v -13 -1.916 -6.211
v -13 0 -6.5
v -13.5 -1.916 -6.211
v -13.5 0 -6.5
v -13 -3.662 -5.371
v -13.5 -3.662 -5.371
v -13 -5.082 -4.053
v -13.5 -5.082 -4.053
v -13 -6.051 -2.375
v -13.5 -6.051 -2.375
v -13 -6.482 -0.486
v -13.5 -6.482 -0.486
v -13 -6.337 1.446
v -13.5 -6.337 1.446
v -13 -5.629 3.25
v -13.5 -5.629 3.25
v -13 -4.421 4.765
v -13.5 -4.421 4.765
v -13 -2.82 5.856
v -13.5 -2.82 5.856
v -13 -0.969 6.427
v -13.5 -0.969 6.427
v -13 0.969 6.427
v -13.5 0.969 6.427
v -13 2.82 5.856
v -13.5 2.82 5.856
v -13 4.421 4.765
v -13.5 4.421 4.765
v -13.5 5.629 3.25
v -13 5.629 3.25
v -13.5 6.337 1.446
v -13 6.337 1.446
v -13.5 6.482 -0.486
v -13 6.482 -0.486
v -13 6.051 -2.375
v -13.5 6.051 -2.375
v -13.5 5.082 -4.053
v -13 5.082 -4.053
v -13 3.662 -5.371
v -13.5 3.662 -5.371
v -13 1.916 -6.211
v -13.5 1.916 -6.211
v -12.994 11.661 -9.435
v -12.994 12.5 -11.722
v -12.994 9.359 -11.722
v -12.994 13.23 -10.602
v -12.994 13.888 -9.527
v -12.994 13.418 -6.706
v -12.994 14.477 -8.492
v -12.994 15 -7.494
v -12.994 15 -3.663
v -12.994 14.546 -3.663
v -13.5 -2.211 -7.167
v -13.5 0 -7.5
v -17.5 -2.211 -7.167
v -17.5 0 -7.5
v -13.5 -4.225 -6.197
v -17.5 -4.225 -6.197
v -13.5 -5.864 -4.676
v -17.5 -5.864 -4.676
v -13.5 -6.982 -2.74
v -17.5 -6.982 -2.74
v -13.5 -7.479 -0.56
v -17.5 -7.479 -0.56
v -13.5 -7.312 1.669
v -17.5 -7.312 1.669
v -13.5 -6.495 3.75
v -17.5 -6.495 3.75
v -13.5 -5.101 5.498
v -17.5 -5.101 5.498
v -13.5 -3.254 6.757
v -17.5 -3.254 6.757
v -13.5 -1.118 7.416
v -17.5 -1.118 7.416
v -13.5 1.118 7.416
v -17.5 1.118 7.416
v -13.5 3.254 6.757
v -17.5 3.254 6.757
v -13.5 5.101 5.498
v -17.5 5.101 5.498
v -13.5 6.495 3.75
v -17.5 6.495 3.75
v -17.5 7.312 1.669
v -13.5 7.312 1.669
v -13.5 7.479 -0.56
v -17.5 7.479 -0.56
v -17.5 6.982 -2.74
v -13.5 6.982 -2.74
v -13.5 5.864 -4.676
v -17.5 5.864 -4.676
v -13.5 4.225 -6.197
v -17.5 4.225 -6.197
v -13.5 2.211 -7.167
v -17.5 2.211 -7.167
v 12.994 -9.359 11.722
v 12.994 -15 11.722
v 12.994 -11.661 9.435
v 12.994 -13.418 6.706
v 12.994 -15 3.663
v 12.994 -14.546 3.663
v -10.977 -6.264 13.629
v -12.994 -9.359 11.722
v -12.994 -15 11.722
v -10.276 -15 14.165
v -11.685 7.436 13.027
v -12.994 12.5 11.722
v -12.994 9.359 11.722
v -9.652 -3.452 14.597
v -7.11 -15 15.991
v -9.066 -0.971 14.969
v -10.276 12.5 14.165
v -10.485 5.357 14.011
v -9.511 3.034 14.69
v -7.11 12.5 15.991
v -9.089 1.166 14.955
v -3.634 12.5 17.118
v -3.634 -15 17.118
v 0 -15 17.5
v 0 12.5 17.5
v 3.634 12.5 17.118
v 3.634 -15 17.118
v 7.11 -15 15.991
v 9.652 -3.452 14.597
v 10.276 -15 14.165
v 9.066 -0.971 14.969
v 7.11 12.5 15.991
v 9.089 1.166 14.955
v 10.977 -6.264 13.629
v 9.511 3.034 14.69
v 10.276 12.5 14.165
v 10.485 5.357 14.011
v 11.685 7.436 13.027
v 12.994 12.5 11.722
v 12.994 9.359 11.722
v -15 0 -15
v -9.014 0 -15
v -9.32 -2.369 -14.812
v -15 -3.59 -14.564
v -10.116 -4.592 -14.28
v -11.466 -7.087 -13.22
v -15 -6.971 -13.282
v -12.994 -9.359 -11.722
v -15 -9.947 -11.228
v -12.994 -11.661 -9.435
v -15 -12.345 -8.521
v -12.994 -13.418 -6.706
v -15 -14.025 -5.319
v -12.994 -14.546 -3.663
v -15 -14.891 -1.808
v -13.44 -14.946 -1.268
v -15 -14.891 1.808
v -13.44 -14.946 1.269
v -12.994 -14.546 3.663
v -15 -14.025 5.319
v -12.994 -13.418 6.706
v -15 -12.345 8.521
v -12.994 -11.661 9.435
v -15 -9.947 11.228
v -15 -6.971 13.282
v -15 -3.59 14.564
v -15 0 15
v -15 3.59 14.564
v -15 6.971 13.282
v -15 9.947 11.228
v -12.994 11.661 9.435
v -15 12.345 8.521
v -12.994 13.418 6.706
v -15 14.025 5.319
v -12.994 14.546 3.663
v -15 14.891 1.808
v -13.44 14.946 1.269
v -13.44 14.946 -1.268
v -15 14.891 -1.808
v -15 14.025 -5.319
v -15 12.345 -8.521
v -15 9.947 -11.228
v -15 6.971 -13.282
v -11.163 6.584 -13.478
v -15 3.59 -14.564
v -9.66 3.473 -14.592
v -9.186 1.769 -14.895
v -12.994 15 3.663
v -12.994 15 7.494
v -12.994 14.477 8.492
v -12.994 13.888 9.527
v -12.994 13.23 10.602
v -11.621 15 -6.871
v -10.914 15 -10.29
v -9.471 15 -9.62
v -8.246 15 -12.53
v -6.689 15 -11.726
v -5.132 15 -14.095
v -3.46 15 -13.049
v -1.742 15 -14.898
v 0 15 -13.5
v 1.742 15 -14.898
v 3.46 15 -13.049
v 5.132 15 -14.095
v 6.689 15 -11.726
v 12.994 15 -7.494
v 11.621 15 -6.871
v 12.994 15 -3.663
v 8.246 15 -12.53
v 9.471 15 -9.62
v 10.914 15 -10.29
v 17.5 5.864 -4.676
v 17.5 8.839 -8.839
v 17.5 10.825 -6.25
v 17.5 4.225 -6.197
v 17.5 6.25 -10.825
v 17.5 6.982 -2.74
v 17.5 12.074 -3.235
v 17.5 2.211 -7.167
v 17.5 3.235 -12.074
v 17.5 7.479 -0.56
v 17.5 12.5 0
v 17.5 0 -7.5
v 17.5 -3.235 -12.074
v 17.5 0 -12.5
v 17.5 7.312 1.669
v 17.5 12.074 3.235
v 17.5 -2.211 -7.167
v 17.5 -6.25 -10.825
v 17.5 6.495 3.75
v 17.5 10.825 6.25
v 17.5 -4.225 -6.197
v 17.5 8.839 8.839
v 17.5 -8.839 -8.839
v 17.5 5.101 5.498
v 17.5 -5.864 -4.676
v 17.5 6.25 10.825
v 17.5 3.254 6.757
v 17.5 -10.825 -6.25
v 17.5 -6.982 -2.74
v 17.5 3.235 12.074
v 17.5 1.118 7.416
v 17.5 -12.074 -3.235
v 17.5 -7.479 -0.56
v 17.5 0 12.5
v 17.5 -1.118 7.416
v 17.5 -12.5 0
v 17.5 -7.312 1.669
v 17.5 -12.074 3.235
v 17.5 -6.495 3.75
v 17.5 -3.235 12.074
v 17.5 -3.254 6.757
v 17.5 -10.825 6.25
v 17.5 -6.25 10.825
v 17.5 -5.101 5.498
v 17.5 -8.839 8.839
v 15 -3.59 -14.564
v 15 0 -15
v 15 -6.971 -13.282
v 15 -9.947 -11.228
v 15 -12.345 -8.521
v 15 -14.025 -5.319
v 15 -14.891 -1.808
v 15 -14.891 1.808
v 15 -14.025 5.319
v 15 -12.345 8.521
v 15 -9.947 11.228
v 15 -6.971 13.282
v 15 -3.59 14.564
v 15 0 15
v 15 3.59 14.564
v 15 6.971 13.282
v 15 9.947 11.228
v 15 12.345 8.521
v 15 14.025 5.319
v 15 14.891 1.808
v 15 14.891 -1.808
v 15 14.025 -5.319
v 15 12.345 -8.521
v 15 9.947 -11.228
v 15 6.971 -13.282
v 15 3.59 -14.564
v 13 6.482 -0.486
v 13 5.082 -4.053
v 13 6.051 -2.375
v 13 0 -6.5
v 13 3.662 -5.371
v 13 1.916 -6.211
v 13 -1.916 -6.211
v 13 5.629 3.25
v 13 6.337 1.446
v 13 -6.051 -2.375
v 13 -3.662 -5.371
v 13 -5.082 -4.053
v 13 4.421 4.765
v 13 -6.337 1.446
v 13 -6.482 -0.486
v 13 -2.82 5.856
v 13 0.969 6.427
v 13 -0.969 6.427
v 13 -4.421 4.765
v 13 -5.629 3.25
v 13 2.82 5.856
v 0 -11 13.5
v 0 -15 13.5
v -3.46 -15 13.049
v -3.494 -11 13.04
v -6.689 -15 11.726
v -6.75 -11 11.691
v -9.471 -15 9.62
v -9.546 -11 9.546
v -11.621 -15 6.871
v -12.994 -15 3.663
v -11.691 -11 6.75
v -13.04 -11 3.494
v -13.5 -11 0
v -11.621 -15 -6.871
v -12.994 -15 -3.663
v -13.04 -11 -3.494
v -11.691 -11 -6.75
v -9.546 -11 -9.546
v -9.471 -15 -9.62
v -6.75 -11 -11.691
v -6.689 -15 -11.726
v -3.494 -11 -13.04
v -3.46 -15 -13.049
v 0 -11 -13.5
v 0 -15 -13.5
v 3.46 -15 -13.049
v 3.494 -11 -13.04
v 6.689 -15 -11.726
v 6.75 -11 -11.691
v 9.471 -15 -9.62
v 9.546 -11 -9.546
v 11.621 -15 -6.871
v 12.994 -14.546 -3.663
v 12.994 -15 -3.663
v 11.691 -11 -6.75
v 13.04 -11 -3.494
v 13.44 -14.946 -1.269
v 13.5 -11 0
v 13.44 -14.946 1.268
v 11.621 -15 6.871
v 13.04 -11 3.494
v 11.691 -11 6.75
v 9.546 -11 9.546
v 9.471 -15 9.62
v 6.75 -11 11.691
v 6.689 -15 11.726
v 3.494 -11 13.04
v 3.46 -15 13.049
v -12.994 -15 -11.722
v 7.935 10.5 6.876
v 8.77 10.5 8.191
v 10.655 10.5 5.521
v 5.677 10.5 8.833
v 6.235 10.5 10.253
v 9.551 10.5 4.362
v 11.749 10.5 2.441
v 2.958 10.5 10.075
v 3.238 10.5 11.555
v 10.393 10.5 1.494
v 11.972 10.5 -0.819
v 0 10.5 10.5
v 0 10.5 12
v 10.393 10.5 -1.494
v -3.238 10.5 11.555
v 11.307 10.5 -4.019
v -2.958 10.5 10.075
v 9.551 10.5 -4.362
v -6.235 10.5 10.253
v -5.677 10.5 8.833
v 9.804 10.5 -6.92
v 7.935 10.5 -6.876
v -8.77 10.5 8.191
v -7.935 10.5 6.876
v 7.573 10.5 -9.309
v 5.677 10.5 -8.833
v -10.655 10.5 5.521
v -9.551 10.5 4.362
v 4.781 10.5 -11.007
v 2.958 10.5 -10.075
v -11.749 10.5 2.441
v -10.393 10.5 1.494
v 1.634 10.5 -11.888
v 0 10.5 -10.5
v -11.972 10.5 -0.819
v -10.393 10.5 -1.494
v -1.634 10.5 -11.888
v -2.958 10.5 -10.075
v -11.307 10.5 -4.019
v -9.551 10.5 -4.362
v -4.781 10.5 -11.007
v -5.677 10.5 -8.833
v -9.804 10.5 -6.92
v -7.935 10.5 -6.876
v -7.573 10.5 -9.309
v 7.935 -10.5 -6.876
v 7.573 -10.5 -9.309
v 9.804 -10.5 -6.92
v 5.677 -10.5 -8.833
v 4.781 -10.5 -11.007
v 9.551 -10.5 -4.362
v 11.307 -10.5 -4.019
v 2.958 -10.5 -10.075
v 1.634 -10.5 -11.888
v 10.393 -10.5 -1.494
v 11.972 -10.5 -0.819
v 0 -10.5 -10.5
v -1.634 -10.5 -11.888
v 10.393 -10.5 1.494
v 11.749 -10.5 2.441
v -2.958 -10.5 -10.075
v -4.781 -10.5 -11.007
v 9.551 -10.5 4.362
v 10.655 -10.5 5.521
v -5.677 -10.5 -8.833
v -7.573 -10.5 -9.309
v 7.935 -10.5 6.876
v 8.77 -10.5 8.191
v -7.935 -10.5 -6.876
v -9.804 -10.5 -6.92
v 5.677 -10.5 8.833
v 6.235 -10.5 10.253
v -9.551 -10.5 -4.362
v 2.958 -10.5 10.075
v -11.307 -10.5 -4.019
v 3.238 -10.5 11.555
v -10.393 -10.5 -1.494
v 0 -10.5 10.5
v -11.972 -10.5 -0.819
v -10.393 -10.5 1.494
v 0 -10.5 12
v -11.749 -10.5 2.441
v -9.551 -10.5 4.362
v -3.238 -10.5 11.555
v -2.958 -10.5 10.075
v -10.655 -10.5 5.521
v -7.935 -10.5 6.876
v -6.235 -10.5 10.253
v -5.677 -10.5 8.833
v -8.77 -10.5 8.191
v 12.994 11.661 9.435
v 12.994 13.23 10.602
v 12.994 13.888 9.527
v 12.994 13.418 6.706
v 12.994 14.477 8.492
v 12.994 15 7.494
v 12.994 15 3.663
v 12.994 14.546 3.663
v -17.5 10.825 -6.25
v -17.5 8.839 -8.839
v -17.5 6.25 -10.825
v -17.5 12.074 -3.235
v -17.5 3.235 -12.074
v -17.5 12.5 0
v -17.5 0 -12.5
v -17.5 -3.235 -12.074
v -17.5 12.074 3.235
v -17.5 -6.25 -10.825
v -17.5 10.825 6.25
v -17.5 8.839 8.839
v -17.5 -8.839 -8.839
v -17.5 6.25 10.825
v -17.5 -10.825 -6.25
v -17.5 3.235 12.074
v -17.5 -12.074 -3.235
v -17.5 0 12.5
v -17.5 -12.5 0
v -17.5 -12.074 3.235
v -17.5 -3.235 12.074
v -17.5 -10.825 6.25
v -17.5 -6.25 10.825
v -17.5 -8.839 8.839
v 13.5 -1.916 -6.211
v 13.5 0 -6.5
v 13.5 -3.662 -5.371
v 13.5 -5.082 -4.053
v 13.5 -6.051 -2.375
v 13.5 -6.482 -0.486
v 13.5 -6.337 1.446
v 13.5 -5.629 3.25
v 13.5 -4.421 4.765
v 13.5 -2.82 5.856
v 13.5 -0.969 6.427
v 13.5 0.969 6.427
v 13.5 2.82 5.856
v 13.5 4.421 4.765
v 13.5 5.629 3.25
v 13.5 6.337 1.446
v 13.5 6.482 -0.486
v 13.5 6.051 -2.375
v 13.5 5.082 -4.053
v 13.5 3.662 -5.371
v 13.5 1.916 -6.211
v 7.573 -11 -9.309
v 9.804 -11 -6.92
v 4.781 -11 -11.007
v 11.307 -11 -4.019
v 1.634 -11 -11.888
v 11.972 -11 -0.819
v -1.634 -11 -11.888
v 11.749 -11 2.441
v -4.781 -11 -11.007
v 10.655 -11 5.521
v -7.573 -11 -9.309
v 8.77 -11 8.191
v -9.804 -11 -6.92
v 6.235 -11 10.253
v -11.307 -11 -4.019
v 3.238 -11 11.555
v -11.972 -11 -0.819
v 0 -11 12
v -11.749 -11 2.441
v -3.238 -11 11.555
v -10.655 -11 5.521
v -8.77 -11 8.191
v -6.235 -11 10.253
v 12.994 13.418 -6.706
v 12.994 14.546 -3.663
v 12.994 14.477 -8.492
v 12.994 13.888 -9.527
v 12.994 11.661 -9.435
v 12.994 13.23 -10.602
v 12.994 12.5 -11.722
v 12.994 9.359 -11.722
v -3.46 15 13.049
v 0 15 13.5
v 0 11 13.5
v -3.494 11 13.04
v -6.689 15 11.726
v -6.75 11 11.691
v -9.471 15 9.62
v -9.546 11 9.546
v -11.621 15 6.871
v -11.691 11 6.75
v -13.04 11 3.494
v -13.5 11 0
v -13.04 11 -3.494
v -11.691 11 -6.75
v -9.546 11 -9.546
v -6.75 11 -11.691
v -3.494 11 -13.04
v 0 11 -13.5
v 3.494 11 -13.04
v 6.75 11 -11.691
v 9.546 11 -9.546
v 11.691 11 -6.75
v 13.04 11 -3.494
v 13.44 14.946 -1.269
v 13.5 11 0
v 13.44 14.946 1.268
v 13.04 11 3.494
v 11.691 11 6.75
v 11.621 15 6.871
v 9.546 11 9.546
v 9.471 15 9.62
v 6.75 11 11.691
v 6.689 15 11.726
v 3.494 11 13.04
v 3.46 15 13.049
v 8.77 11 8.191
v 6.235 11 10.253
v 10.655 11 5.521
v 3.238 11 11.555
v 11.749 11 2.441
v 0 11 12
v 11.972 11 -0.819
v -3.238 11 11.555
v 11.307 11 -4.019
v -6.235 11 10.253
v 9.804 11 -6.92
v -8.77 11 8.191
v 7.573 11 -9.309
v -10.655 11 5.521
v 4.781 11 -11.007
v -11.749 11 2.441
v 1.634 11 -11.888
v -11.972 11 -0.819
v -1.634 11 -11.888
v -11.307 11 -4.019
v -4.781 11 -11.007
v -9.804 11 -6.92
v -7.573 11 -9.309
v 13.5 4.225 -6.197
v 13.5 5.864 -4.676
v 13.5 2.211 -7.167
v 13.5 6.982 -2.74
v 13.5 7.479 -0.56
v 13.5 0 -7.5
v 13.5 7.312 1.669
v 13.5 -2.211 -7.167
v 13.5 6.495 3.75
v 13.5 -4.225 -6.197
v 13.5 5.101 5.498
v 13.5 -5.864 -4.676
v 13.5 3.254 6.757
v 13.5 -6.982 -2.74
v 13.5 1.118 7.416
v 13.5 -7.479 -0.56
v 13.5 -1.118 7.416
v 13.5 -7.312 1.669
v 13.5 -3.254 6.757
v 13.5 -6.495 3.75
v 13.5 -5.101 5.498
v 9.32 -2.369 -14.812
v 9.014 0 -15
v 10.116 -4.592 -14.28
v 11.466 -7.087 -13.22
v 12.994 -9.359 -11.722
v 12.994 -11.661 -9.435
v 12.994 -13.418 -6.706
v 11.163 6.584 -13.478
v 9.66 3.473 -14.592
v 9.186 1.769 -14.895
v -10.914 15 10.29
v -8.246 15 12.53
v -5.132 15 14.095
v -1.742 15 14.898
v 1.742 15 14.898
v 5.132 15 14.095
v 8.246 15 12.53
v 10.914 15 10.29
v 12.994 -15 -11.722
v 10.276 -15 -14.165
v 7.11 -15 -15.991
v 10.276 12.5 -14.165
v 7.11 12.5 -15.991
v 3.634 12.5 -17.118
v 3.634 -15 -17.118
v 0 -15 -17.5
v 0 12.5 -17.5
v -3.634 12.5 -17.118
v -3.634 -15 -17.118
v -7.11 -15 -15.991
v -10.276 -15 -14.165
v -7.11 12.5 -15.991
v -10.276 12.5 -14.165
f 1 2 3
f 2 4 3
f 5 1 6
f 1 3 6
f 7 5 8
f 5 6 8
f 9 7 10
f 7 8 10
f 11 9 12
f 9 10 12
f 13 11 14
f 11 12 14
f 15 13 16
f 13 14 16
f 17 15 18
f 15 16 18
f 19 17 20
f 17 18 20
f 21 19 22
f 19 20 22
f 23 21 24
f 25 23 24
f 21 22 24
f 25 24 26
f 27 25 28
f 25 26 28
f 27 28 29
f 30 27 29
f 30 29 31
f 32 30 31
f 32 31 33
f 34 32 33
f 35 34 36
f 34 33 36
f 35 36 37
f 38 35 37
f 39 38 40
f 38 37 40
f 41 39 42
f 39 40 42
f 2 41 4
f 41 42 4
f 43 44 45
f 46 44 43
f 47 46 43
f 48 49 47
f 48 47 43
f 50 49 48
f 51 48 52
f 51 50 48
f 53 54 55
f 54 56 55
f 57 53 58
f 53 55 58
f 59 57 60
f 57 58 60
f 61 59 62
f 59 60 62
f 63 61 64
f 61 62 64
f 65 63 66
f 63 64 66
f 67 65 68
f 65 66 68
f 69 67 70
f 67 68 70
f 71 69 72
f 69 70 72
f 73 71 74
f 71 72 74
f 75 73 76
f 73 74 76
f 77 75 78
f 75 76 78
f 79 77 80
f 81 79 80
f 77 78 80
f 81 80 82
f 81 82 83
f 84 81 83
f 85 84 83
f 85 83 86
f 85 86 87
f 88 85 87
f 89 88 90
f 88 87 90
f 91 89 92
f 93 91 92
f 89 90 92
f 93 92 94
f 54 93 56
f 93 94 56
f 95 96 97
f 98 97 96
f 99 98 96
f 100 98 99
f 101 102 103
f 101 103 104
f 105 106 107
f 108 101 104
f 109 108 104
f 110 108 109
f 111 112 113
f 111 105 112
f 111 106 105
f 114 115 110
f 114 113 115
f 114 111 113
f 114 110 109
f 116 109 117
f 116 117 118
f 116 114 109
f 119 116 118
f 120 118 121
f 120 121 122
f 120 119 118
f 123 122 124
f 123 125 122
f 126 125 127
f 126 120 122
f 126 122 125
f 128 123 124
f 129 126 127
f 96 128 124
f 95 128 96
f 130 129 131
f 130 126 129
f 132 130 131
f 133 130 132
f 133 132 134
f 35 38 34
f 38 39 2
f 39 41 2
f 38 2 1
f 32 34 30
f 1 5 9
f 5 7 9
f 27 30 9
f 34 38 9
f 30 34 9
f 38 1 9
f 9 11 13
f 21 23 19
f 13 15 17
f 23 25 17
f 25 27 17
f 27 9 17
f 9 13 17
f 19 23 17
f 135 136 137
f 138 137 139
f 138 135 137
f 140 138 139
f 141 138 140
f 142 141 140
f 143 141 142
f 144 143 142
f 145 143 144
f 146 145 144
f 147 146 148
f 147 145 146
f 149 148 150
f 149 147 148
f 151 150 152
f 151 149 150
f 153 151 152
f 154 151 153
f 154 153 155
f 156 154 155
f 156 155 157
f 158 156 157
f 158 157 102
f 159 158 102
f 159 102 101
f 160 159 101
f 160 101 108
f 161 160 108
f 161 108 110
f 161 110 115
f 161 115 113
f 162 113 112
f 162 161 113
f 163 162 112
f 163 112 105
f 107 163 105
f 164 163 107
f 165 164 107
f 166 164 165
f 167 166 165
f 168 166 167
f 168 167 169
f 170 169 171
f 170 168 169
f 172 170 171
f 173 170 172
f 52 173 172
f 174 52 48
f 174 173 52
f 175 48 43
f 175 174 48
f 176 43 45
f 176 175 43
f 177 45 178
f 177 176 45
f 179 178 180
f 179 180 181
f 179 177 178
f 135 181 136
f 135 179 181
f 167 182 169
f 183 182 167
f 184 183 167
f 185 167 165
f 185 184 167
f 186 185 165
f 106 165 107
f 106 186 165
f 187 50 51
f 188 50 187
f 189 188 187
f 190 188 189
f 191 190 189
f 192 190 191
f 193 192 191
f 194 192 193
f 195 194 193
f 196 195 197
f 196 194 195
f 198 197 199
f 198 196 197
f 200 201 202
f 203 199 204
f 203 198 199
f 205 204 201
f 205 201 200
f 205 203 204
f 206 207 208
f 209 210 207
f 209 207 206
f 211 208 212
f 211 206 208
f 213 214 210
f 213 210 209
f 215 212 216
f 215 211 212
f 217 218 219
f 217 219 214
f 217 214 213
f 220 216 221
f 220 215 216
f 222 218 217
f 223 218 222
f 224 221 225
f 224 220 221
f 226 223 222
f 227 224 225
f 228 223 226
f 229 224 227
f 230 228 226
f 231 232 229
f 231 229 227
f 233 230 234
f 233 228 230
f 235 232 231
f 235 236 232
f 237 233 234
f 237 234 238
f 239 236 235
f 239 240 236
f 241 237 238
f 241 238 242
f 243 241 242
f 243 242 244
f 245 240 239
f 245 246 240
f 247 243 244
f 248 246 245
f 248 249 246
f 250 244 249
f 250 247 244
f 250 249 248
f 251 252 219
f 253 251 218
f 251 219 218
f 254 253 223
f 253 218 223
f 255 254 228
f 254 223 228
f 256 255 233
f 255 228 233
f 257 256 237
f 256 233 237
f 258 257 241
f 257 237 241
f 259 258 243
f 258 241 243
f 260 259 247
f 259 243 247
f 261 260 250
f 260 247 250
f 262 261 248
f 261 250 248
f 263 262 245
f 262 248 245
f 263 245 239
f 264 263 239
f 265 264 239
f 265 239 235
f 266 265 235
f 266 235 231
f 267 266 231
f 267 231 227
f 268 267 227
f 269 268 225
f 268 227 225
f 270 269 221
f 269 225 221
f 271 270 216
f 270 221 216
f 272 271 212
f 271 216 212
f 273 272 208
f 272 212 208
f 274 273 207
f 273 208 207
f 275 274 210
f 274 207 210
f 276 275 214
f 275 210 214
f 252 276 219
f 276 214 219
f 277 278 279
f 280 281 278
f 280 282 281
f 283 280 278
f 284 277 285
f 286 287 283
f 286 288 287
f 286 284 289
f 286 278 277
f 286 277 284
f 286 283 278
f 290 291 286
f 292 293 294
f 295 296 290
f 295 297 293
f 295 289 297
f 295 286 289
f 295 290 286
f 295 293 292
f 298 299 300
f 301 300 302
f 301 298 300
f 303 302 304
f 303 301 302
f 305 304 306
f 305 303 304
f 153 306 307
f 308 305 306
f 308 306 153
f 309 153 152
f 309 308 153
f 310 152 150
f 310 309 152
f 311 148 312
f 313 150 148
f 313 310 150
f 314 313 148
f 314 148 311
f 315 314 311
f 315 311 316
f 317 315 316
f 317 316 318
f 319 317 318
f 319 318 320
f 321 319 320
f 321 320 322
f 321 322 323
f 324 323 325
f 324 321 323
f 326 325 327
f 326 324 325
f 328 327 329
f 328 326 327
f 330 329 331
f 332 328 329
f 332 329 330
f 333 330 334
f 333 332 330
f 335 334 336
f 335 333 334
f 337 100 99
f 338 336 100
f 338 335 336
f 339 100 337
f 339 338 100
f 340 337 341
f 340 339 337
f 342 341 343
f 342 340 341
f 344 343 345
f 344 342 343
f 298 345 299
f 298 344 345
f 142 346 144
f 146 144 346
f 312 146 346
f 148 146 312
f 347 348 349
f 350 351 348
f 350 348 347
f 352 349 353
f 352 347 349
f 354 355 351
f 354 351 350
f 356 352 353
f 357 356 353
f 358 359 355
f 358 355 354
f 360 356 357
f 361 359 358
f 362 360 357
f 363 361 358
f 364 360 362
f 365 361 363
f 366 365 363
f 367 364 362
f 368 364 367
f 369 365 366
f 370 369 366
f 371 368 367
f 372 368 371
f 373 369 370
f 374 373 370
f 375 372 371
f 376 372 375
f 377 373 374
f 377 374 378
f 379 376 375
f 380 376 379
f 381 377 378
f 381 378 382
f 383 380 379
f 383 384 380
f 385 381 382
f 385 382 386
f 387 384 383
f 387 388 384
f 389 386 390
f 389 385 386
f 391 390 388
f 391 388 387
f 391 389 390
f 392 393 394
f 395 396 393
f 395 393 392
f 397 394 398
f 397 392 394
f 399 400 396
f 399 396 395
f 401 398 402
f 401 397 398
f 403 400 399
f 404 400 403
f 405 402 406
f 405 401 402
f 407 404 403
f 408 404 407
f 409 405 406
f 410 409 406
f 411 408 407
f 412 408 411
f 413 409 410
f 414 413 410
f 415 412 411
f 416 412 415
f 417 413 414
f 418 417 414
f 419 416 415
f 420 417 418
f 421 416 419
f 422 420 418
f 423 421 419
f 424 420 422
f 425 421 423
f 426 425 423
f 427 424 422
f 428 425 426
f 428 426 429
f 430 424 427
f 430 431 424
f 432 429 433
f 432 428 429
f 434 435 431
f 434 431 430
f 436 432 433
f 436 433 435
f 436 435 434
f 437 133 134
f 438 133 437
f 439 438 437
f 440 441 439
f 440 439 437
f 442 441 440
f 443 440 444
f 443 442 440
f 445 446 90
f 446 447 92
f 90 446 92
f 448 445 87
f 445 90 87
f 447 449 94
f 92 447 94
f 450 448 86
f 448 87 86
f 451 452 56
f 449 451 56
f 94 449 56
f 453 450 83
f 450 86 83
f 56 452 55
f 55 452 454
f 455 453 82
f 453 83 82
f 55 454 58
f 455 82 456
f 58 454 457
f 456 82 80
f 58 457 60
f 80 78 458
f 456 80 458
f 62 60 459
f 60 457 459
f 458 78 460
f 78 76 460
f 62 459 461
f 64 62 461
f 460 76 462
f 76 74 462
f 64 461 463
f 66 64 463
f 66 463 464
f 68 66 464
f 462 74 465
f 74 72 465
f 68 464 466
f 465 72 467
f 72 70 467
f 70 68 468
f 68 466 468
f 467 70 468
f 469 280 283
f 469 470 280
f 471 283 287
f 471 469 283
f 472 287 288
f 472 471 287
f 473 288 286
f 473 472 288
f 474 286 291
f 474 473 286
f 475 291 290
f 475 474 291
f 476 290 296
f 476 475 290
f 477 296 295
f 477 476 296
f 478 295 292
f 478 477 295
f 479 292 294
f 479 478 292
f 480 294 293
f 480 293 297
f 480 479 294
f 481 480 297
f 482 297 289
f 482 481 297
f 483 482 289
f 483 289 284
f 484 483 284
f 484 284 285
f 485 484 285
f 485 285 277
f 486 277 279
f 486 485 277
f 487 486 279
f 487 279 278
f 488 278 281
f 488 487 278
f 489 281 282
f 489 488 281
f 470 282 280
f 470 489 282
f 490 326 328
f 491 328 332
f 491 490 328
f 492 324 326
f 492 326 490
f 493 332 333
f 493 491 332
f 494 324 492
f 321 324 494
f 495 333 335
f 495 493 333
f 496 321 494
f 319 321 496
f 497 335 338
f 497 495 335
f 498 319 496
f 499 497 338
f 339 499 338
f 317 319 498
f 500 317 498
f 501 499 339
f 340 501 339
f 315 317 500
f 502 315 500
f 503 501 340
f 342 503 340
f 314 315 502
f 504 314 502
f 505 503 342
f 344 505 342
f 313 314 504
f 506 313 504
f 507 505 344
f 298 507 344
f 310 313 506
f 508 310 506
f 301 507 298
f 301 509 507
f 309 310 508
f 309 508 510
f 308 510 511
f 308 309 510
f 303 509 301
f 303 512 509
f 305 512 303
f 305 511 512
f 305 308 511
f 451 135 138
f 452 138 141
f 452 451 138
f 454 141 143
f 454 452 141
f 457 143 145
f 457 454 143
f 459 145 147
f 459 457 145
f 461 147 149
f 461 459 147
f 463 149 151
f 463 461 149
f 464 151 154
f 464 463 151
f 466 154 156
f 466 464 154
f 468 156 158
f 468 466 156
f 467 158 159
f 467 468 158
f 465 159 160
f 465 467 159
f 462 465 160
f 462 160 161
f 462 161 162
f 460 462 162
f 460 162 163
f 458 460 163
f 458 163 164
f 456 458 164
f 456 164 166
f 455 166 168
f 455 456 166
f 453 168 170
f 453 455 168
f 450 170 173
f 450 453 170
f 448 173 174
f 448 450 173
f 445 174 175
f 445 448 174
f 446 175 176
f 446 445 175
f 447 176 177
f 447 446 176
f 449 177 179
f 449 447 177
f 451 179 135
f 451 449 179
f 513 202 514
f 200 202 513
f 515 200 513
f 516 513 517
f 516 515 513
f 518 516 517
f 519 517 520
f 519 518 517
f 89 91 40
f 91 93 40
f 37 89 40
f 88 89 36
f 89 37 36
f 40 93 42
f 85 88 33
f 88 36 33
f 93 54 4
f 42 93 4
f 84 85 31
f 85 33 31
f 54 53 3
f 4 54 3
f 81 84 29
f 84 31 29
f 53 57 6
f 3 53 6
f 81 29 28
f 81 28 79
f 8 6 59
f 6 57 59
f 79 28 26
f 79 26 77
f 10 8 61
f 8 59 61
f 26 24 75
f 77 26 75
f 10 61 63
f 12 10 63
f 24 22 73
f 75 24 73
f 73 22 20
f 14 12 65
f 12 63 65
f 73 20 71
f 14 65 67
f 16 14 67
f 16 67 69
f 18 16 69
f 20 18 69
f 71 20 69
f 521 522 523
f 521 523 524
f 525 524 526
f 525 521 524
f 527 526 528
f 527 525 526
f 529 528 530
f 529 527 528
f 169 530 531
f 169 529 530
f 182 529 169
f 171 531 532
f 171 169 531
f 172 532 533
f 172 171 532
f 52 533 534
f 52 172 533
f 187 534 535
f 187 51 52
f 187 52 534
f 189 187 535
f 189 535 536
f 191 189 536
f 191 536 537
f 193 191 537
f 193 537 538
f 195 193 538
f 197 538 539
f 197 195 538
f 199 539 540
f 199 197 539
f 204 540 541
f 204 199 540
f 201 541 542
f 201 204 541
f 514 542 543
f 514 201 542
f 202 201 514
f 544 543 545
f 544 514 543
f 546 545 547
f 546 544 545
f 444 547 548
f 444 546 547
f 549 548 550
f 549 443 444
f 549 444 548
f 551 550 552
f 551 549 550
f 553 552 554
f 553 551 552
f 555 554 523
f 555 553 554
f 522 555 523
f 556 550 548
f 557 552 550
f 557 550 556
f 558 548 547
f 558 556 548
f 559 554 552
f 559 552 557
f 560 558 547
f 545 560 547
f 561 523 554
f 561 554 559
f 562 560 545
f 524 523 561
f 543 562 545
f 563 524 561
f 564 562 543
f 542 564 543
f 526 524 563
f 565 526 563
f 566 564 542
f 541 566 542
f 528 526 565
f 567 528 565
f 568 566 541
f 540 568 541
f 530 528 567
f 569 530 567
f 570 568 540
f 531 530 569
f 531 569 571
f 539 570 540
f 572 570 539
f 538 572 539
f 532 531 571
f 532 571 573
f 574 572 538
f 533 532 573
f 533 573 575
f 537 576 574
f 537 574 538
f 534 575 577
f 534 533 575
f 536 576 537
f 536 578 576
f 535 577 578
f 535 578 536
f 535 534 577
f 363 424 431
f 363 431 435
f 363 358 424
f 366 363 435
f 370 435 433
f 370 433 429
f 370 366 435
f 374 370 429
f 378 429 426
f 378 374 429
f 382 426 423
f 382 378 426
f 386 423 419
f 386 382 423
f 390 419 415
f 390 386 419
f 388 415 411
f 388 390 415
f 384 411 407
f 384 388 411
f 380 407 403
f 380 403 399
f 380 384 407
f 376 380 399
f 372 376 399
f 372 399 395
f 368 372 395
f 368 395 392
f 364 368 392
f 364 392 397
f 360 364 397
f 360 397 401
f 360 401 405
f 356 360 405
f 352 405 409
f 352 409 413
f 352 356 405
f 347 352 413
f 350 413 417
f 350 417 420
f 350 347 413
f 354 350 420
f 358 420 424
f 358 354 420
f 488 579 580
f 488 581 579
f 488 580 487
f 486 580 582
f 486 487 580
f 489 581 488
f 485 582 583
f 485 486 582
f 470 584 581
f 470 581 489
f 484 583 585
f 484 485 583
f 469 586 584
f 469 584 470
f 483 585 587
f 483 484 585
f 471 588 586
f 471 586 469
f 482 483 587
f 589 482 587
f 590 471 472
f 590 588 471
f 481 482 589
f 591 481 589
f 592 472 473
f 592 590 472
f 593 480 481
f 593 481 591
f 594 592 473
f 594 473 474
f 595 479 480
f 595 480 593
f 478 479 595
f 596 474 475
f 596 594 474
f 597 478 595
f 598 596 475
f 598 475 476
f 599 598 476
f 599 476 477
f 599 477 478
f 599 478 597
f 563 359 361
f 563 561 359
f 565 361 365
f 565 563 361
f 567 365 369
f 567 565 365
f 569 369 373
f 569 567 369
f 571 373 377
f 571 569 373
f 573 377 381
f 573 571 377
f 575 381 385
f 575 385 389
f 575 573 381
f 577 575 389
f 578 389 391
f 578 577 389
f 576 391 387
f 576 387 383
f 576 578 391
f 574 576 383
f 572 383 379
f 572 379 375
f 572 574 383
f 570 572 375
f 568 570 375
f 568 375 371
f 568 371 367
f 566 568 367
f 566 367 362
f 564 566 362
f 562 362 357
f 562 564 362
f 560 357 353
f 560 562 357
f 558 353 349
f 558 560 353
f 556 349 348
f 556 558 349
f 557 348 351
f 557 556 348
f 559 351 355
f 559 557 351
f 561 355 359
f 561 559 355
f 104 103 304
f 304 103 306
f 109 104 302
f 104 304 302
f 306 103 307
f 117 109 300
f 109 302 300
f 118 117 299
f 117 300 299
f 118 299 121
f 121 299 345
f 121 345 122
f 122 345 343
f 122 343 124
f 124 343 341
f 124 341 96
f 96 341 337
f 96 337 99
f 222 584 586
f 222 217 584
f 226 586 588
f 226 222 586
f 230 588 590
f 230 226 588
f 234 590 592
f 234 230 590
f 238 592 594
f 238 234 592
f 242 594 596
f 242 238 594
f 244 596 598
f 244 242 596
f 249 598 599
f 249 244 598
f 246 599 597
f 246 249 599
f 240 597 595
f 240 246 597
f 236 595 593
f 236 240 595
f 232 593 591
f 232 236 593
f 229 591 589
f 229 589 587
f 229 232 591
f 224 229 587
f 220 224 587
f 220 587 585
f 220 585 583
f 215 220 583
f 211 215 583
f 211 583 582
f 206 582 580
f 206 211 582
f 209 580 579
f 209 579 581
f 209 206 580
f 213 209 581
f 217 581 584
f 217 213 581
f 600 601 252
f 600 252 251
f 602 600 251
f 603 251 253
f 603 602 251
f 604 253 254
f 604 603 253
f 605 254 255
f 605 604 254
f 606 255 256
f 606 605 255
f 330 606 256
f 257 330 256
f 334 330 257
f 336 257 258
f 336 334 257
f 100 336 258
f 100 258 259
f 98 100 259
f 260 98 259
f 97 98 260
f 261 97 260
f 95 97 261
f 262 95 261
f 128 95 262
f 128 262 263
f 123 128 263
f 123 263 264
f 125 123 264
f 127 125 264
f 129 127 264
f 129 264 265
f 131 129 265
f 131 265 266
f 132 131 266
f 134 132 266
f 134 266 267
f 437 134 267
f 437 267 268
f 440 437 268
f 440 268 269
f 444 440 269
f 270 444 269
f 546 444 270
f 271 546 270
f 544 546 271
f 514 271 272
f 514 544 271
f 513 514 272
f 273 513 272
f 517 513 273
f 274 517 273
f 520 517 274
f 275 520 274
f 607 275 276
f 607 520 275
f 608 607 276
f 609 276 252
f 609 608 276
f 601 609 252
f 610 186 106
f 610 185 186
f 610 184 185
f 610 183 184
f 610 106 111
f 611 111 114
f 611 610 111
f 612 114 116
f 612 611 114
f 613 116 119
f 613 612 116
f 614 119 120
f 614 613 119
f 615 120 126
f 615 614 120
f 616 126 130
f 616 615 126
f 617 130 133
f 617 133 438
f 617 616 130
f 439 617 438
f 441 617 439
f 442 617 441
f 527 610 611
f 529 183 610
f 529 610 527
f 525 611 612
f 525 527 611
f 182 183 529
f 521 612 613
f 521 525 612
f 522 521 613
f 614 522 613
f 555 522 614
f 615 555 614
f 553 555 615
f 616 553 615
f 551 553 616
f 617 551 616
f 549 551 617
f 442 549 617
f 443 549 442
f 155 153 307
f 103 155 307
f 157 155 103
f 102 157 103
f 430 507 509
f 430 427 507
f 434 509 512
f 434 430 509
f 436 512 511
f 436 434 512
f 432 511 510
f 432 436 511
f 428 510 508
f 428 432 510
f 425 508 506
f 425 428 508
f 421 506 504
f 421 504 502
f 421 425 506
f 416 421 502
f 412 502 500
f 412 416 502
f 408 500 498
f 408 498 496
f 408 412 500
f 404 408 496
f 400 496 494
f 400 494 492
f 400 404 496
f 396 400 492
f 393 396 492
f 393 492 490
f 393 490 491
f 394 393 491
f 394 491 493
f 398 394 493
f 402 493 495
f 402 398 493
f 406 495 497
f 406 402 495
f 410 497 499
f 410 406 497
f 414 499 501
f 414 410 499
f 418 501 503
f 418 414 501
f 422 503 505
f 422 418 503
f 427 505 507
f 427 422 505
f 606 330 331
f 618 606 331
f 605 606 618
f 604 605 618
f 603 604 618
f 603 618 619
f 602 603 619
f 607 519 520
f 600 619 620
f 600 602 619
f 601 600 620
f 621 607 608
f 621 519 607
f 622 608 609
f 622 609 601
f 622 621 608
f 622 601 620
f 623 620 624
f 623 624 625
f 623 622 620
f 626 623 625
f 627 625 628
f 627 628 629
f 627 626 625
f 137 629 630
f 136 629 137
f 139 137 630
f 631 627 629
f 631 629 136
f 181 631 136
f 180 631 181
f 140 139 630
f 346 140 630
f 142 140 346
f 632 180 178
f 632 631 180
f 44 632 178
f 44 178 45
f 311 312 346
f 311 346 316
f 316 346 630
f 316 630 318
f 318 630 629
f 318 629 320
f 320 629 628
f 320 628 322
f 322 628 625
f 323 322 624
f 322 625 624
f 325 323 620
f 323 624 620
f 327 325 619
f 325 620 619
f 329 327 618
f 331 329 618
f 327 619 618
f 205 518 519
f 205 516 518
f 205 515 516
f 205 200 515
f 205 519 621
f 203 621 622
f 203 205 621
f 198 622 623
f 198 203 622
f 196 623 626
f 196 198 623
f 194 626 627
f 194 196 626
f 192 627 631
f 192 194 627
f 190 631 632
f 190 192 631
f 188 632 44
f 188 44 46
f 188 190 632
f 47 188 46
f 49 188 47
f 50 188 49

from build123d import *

# Parameters (mm, degrees)
BOSS_EXTRUDE1_DEPTH  = 15
F_2_5MM_CHAMFER_SIZE = 2.5


with BuildPart() as part:
    # Sketch3 → Revolve1 (revolve)
    with BuildSketch(Plane(origin=(0, 0, 0), x_dir=(1, 0, 0), z_dir=(0, 1, 0))):
        Polygon((0, 0), (-13, 0), (-13, 6.5), (-13.5, 6.5), (-13.5, 7.5), (-17.5, 7.5), (-17.5, 15), (0, 15), align=None)
    revolve1 = revolve(axis=Axis((0, 0, 0), (-1, 0, 0)))

    # Mirror1: Revolve1 across plane
    add(revolve1.mirror(Plane(origin=(0, 0, 0), x_dir=(0, 0, 1), z_dir=(1, 0, 0))))

    # Sketch6 → Boss-Extrude1 (add, symmetric)
    with BuildSketch(Plane(origin=(0, 0, 0), x_dir=(1, 0, 0), z_dir=(0, 1, 0))):
        with BuildLine():
            ThreePointArc((12.993588105, 11.722485579), (0, 17.5), (-12.993588105, 11.722485579))
            Line((-12.993588105, 11.722485579), (-12.993588105, -11.722485579))
            ThreePointArc((-12.993588105, -11.722485579), (0, -17.5), (12.993588105, -11.722485579))
            Line((12.993588105, -11.722485579), (12.993588105, 11.722485579))
        make_face()
    extrude(amount=BOSS_EXTRUDE1_DEPTH, both=True)

    # Sketch8 → Cut-Revolve1 (revolve, cut)
    with BuildSketch(Plane.XY, mode=Mode.PRIVATE) as cut_revolve1_sk:
        Polygon((0, -15), (13.5, -15), (13.5, -11), (12, -11), (12, -10.5), (10.5, -10.5), (10.5, 10.5), (12, 10.5), (12, 11), (13.5, 11), (13.5, 15), (0, 15), align=None)
    revolve(cut_revolve1_sk.sketch.rotate(Axis((0, 15, 0), (0, -1, 0)), 90), axis=Axis((0, 15, 0), (0, -1, 0)), mode=Mode.SUBTRACT)

    # 2,5mm Chamfer
    f_2_5mm_chamfer_edges = [part.edges().sort_by_distance(p)[0] for p in [
        (-17.5, 0, 15),
        (17.5, 0, 15),
        (0, 15, 17.5),
        (0, 15, -17.5),
    ]]
    chamfer(f_2_5mm_chamfer_edges, length=F_2_5MM_CHAMFER_SIZE)


solid = part.part
